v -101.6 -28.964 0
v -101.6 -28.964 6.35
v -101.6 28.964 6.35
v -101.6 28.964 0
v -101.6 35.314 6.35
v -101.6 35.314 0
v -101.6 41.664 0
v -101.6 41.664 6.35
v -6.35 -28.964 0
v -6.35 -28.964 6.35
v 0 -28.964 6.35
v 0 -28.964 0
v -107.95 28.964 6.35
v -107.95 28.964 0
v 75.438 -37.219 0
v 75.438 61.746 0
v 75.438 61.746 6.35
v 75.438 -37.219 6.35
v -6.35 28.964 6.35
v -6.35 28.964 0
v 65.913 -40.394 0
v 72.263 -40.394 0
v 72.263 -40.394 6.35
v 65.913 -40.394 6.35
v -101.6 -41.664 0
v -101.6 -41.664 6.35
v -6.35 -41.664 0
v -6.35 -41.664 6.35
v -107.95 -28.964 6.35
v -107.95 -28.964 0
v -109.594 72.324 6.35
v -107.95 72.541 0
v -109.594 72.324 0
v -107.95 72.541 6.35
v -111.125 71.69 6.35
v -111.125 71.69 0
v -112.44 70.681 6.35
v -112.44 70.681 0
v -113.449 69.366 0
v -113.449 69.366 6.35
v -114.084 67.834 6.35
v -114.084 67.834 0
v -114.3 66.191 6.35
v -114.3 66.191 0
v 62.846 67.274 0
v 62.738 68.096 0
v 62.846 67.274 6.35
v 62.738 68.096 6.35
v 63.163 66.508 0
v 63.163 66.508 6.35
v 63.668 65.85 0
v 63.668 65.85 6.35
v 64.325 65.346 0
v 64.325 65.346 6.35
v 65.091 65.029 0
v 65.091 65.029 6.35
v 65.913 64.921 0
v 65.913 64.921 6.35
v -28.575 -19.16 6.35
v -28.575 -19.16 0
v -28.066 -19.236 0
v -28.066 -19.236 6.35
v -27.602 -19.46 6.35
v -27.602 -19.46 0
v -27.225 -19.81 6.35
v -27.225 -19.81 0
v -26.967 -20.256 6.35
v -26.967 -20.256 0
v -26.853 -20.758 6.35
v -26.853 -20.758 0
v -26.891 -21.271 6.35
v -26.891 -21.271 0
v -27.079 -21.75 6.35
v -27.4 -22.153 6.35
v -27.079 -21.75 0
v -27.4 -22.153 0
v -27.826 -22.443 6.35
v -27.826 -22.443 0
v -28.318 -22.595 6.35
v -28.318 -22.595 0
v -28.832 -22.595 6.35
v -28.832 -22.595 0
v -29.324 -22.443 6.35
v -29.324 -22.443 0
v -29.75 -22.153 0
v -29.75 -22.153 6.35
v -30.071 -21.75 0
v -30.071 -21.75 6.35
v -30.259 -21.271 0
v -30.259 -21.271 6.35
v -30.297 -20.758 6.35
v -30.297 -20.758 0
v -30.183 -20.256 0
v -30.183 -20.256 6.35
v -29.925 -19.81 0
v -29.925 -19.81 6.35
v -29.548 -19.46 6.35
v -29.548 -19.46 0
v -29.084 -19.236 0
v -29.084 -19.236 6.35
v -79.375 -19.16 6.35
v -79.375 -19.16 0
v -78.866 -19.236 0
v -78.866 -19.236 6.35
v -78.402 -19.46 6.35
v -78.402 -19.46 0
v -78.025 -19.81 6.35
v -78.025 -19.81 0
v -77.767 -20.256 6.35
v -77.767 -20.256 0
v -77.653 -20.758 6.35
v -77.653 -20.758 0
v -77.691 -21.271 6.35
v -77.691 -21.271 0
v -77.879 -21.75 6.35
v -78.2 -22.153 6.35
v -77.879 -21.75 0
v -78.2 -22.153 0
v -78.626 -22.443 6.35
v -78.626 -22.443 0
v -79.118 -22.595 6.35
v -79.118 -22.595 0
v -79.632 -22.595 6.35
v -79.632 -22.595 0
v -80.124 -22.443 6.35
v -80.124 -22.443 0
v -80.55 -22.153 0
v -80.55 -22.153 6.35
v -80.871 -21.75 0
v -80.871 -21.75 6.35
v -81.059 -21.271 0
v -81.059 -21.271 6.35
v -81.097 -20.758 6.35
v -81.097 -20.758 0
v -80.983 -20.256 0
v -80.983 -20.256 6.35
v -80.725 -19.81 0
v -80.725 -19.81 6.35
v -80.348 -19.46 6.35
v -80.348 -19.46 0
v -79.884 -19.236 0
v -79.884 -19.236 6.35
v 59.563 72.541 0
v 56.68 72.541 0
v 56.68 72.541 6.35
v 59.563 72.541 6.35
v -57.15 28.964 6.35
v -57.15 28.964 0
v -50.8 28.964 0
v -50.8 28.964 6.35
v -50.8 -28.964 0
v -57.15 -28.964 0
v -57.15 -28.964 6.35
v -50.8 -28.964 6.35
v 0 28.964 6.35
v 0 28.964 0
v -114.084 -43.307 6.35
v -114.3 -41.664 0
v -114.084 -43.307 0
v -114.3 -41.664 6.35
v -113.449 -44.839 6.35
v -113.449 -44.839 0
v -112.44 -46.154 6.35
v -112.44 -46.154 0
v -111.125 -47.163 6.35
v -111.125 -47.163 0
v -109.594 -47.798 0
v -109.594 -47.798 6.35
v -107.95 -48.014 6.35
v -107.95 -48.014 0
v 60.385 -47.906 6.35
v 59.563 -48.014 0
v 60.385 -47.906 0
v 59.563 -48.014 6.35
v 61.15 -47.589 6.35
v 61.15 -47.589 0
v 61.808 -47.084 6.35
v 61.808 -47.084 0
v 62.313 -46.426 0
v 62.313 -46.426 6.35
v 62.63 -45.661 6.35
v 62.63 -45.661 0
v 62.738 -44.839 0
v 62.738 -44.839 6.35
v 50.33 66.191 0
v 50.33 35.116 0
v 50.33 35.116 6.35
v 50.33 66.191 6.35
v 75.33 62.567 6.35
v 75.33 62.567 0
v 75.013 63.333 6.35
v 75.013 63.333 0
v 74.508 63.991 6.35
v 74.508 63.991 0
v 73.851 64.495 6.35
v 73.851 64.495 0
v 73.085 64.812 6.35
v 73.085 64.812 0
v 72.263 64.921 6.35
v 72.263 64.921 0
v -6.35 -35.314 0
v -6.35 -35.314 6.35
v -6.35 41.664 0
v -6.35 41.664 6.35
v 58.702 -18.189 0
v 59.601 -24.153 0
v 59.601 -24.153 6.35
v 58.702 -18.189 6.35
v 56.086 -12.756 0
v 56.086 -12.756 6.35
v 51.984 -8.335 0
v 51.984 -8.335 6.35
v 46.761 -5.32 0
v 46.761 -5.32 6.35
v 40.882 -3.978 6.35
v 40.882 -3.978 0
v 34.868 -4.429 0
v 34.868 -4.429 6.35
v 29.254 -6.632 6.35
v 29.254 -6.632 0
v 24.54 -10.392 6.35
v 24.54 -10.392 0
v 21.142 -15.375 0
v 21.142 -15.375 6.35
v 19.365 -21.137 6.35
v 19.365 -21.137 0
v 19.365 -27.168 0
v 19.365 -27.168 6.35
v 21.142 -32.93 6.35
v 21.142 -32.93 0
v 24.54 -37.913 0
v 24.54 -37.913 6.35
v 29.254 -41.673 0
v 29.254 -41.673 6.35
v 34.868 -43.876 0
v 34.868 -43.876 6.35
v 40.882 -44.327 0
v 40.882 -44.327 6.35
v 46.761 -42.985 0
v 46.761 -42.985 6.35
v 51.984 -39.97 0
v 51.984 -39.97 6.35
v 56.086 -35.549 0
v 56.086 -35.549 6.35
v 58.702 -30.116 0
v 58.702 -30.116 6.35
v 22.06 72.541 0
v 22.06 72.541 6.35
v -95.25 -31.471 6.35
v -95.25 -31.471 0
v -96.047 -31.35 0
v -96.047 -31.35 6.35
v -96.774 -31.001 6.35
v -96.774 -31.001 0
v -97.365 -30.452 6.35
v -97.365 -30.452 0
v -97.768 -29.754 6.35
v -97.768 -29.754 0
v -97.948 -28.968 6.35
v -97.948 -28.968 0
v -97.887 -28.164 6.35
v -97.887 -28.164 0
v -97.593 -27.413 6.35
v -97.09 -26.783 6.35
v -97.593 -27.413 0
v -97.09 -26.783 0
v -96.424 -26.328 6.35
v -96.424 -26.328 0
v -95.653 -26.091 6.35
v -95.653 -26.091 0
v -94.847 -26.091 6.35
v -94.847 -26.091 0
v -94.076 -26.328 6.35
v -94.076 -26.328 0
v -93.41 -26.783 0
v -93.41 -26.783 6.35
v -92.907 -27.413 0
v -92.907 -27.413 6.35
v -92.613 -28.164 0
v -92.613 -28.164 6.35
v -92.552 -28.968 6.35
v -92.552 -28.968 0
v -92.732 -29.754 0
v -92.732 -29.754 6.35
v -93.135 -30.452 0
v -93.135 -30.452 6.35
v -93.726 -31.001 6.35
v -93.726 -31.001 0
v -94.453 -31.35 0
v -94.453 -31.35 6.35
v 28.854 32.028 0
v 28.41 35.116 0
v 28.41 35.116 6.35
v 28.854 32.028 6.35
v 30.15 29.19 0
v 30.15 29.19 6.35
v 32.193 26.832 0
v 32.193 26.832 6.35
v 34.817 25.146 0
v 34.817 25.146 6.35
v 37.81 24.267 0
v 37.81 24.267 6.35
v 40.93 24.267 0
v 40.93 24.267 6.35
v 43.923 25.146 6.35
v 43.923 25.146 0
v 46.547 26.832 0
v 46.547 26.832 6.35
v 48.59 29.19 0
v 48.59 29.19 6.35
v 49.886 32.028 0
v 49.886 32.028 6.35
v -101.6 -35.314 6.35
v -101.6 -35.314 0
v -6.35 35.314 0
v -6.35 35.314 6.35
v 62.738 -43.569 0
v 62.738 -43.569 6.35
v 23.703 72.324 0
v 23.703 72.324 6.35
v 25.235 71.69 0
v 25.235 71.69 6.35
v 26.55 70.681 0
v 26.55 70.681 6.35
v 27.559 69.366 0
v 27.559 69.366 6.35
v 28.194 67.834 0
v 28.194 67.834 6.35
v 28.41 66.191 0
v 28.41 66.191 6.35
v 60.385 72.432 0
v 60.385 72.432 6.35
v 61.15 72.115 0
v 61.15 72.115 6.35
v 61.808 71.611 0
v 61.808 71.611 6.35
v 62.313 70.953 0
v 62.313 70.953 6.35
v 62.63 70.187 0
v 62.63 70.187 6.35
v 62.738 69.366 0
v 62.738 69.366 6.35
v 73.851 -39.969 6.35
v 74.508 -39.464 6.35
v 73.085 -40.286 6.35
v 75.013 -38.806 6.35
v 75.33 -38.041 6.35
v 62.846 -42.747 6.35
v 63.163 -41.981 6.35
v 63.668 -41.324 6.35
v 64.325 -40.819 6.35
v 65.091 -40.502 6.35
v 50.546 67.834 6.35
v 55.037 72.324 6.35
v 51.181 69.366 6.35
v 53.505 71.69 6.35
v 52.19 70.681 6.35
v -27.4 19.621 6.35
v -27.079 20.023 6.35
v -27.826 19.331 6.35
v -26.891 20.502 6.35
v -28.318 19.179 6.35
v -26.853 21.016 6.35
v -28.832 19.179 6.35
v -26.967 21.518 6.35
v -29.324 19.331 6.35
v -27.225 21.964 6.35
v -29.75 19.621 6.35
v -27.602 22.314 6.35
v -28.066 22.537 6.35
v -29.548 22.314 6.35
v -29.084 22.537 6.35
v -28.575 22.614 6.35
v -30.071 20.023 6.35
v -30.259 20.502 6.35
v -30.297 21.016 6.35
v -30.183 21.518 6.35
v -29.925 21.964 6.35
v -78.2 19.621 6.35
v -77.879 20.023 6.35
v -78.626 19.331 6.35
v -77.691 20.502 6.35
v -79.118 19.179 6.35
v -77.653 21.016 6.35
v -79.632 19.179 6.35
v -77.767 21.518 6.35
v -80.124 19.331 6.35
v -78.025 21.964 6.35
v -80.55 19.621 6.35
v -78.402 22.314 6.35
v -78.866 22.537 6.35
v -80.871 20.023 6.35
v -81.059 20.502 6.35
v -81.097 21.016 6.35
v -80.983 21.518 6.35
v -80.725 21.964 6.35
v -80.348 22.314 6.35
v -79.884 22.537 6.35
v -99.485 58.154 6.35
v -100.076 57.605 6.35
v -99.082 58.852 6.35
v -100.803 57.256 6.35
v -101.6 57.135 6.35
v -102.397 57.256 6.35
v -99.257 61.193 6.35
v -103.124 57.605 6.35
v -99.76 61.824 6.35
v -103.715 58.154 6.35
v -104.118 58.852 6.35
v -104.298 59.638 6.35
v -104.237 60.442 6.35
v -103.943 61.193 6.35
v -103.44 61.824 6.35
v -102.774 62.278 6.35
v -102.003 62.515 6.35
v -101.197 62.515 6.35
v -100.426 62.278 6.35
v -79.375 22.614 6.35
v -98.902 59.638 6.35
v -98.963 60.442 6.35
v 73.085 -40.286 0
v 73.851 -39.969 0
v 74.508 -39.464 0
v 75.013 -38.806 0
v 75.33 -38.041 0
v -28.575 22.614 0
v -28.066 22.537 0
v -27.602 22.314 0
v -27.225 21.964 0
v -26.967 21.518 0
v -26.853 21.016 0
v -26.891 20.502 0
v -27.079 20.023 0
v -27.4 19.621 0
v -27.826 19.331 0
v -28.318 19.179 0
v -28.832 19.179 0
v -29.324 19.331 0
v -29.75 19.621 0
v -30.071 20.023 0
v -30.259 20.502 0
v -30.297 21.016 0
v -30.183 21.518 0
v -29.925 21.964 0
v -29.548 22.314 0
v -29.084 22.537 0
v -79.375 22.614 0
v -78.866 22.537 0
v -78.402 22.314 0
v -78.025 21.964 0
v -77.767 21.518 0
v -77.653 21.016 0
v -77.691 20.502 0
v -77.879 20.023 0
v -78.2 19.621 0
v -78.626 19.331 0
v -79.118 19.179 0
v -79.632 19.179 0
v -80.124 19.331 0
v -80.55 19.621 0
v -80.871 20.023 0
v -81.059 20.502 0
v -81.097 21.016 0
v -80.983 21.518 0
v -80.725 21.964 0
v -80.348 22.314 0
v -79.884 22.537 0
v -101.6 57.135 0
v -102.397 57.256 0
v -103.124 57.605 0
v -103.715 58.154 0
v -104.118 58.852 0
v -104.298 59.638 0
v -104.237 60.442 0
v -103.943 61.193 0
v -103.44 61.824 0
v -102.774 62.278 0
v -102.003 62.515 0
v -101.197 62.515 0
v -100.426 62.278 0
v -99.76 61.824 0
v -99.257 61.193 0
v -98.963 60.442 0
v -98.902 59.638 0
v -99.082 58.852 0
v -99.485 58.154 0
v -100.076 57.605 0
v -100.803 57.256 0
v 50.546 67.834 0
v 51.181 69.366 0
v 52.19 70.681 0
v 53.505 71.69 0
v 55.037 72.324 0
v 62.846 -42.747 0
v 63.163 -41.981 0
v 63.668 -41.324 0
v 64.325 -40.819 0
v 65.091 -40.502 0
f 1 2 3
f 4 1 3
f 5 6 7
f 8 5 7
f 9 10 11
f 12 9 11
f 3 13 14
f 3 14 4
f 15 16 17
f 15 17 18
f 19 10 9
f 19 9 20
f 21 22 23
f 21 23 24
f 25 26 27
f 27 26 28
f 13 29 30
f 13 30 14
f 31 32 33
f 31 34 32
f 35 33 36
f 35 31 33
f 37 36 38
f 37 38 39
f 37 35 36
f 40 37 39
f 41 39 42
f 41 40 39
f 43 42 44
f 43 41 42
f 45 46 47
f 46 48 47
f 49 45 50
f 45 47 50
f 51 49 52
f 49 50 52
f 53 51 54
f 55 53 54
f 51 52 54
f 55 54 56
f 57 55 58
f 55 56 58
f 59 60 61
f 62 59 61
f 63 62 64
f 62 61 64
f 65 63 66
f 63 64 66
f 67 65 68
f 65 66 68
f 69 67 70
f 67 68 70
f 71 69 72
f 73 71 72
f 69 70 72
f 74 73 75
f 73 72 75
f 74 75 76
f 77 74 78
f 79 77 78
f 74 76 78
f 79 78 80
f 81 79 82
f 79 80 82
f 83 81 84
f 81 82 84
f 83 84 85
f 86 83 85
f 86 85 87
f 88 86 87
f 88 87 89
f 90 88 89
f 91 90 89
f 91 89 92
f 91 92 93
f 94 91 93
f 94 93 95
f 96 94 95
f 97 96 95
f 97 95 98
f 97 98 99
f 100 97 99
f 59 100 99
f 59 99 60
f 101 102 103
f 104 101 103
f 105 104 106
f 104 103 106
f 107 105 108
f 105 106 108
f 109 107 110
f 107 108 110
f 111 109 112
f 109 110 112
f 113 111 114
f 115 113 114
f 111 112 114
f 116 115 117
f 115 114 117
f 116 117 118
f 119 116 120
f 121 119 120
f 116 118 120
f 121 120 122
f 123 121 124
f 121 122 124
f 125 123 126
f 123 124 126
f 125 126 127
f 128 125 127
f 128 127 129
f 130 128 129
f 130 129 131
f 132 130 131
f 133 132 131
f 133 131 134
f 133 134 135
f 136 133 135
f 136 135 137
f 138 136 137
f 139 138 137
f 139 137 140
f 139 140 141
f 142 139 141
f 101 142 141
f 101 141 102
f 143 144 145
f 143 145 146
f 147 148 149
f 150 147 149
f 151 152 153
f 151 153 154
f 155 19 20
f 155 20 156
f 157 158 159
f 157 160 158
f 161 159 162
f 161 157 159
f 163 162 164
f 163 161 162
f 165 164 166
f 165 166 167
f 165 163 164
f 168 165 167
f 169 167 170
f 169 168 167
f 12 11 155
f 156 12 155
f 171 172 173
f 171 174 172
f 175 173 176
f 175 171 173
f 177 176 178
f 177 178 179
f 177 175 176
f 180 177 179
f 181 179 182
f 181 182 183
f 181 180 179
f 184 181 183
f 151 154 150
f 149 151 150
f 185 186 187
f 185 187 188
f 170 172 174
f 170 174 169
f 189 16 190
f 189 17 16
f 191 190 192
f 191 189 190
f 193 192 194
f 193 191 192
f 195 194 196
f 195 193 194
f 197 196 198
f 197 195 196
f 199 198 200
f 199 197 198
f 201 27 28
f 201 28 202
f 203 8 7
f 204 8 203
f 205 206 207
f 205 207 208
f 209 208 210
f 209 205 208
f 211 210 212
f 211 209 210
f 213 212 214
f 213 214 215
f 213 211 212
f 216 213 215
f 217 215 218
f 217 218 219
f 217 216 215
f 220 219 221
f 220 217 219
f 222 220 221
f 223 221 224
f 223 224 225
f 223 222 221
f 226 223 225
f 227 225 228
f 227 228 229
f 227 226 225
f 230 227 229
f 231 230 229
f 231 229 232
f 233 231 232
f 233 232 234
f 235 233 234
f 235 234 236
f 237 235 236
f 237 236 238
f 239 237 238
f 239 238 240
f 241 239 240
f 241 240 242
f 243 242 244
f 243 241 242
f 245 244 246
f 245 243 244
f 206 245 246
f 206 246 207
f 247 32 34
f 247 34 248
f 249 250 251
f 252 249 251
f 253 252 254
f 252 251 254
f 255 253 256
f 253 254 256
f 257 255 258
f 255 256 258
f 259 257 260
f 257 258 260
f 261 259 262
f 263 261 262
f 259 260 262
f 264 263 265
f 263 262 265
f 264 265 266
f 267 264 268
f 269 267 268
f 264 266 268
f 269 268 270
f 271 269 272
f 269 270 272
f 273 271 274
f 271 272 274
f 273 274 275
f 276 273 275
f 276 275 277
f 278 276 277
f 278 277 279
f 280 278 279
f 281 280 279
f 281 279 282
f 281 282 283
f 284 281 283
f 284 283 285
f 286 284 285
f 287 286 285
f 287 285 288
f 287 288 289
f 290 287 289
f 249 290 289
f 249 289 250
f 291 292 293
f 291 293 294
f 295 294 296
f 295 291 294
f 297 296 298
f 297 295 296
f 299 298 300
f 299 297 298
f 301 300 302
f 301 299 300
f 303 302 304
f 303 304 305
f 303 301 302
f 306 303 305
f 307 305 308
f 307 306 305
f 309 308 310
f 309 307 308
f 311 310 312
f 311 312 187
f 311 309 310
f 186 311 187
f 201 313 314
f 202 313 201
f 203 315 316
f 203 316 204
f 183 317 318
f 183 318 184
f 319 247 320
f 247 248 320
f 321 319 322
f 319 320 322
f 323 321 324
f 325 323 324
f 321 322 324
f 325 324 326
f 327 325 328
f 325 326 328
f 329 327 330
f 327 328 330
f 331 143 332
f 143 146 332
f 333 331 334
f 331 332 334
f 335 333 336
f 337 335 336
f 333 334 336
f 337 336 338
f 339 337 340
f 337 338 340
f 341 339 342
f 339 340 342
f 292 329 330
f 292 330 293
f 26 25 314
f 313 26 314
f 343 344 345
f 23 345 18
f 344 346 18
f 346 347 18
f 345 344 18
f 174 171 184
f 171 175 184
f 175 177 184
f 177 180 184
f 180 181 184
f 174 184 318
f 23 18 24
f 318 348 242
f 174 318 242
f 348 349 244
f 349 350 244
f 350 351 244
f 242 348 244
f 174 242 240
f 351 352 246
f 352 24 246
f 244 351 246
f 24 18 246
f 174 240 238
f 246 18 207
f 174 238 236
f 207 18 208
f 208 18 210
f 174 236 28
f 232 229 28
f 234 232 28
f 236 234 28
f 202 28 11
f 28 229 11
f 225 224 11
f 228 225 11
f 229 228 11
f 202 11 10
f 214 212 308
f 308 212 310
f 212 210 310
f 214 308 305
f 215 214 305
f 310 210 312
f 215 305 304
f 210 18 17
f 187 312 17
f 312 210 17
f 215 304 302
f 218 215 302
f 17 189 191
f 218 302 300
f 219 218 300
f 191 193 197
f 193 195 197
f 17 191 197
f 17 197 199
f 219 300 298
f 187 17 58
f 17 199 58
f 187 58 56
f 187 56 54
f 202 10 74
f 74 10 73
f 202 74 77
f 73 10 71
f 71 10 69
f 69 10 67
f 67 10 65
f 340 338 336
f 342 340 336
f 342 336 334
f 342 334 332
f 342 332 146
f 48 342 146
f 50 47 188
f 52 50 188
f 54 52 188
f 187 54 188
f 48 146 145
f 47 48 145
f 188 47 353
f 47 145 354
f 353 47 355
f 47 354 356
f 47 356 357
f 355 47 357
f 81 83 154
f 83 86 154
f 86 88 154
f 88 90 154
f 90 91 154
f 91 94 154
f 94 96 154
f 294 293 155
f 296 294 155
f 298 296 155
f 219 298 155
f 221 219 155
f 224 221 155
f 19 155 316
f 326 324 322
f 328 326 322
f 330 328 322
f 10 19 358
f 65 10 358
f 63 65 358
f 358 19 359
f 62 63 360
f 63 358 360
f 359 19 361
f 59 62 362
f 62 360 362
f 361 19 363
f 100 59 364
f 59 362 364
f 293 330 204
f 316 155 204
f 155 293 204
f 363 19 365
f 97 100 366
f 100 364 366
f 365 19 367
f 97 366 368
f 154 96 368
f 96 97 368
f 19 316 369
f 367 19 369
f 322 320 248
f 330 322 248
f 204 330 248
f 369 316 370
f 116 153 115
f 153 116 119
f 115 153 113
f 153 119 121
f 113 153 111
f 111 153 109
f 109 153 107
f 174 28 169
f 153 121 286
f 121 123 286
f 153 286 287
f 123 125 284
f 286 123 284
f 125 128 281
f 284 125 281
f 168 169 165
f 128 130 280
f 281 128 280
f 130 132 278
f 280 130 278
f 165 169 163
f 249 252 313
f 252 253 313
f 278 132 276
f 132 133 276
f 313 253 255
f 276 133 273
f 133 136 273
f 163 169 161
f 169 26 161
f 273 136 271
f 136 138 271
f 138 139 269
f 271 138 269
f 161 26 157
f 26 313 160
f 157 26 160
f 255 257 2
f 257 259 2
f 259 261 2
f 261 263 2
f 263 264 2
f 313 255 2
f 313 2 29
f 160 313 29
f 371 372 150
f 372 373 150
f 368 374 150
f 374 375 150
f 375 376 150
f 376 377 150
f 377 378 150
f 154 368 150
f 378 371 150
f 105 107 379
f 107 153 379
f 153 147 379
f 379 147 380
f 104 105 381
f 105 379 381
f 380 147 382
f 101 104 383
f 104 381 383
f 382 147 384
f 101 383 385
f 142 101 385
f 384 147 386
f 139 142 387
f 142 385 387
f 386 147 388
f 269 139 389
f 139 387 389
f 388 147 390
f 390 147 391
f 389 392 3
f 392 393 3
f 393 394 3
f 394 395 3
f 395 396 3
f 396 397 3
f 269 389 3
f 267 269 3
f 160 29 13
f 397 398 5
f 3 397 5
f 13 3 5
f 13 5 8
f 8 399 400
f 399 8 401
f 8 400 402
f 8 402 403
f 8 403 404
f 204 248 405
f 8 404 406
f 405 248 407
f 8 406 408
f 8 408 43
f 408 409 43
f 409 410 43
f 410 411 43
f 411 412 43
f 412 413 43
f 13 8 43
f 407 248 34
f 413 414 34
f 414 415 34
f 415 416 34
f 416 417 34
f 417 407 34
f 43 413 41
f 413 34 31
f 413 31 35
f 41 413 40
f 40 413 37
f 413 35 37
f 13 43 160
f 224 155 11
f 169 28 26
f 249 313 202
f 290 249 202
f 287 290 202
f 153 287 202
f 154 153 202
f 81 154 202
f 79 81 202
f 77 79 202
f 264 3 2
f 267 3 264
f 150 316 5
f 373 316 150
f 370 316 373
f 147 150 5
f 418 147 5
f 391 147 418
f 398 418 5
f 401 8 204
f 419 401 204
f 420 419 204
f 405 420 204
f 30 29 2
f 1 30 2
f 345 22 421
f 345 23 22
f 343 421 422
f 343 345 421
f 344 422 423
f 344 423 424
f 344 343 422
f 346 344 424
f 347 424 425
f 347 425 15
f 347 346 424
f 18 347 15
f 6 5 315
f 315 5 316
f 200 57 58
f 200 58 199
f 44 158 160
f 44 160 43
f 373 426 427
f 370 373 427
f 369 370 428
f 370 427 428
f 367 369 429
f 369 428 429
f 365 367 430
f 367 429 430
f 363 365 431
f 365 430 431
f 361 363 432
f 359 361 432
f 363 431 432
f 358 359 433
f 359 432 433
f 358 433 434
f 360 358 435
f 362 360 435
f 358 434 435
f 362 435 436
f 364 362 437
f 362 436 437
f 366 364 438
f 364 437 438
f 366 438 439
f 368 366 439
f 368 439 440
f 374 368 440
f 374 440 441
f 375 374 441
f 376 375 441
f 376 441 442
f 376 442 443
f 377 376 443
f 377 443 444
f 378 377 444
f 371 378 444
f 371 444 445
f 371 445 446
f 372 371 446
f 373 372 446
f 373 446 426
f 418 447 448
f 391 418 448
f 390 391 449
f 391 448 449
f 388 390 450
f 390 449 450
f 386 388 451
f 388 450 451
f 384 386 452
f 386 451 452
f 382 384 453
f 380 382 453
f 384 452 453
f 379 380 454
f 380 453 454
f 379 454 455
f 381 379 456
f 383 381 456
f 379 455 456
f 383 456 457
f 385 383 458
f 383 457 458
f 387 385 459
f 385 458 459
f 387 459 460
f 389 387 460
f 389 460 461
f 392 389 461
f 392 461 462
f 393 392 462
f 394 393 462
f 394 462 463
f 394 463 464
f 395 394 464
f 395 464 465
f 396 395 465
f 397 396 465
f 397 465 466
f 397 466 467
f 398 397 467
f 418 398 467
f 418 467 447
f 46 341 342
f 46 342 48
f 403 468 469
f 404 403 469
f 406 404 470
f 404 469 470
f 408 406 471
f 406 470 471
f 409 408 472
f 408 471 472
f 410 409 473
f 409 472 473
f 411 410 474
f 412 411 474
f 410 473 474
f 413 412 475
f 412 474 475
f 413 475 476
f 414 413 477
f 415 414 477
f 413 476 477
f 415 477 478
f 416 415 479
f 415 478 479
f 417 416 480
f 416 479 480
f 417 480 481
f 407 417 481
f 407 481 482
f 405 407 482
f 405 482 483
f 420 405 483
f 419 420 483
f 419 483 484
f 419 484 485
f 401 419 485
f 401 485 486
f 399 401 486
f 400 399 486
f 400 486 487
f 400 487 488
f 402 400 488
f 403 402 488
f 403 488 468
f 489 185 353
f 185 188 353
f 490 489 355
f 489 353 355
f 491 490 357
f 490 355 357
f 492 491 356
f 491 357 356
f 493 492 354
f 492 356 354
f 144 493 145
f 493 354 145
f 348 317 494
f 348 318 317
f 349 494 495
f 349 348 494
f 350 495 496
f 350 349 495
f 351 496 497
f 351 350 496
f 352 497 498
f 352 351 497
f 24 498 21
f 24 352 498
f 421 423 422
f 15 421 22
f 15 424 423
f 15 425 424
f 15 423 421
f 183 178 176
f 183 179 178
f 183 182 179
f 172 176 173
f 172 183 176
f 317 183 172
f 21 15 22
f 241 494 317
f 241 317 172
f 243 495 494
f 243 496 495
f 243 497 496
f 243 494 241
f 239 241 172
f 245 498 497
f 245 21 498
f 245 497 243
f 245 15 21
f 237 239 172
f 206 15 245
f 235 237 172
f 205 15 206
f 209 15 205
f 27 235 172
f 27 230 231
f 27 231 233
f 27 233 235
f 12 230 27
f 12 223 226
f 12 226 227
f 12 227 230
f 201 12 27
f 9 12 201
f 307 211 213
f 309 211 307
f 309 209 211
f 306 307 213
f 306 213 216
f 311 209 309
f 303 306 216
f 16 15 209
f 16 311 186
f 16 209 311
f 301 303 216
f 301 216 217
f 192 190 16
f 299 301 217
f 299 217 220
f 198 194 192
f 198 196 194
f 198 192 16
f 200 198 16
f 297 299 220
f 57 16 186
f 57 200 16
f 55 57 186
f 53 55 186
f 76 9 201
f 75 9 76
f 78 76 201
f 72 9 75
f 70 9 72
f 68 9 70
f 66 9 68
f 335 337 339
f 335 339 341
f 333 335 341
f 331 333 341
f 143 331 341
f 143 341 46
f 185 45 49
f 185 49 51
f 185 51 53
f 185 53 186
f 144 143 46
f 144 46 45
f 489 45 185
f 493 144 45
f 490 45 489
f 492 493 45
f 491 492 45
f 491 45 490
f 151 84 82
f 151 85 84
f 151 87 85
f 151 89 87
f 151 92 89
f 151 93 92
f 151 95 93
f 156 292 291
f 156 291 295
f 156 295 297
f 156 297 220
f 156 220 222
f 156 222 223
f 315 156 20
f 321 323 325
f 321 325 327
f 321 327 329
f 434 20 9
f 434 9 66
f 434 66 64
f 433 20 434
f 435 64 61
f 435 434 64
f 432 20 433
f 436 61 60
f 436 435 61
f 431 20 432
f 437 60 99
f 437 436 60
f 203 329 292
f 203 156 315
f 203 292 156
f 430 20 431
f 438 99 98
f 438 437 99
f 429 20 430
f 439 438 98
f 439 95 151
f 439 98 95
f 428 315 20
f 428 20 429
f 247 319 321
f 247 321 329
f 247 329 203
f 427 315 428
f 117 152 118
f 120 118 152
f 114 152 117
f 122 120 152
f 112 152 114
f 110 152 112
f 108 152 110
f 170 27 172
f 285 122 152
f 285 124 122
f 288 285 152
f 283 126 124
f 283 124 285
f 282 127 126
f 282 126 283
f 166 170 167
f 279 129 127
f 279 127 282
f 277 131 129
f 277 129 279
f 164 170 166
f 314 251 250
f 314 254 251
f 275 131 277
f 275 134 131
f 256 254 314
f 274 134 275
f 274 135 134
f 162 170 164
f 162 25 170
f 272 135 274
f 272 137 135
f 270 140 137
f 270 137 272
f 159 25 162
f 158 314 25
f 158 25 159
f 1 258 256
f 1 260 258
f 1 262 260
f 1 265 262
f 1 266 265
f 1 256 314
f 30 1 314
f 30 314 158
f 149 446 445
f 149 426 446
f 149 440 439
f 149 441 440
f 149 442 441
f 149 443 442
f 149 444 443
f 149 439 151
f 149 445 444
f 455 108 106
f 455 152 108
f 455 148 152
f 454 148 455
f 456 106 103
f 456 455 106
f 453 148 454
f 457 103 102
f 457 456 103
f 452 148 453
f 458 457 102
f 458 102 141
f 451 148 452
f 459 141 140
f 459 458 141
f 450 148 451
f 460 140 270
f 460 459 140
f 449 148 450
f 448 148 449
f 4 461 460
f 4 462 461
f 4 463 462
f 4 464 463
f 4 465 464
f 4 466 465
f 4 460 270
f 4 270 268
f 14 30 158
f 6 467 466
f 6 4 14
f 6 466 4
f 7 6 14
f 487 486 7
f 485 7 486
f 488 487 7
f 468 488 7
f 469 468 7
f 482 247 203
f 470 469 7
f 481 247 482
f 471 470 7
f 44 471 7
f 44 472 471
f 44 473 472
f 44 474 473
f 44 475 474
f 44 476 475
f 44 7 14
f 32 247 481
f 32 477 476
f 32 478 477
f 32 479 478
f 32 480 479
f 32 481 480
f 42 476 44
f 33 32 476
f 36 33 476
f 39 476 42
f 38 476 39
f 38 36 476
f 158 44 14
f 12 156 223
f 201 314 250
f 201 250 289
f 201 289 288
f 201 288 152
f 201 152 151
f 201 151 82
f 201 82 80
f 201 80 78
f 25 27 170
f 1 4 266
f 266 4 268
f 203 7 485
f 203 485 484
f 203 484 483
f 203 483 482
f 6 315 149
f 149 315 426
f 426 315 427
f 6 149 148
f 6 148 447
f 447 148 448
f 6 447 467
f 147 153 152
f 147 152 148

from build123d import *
from OCP.BRepFilletAPI import BRepFilletAPI_MakeFillet

# Parameters (mm, degrees)
SKETCH1_R                   = 20.2311
BOSS_EXTRUDE1_DEPTH         = 6.35
FILLET1_R1                  = 6.35
FILLET1_R2                  = 3.175
TAP_DRILL_FOR_8_32_TAP3_D   = 3.4544
TAP_DRILL_FOR_1_4_28_TAP1_D = 5.4102
SKETCH13_W                  = 95.25
SKETCH13_H                  = 6.35
SKETCH13_W_2                = 6.35
SKETCH13_H_2                = 57.927875
CUT_EXTRUDE1_DEPTH          = 136.524699219


with BuildPart() as part:
    # Sketch1 → Boss-Extrude1 (new body)
    with BuildSketch(Plane.XY):
        with BuildLine():
            Line((-114.3, 72.540551407), (28.4099, 72.540551407))
            Line((28.4099, 72.540551407), (28.4099, 35.1155))
            ThreePointArc((28.4099, 35.1155), (39.37, 24.1554), (50.3301, 35.1155))
            Line((50.3301, 35.1155), (50.3301, 72.540551407))
            Line((50.3301, 72.540551407), (62.738, 72.540551407))
            Line((62.738, 72.540551407), (62.738, 64.920551407))
            Line((62.738, 64.920551407), (75.438, 64.920551407))
            Line((75.438, 64.920551407), (75.438, -40.3939375))
            Line((75.438, -40.3939375), (62.738, -40.3939375))
            Line((62.738, -40.3939375), (62.738, -48.0139375))
            Line((62.738, -48.0139375), (-114.3, -48.0139375))
            Line((-114.3, -48.0139375), (-114.3, 72.540551407))
        make_face()
        with Locations((39.37, -24.152515463)):
            Circle(SKETCH1_R, mode=Mode.SUBTRACT)
    extrude(amount=BOSS_EXTRUDE1_DEPTH)

    # Fillet1: one fillet with a radius per group of edges: ONE call of the kernel's fillet builder (fillet() takes one radius for all edges)
    fillet1_edges_1 = [part.edges().sort_by_distance(p)[0] for p in [
        (50.3301, 72.540551407, 3.175),
        (28.4099, 72.540551407, 3.175),
        (-114.3, 72.540551407, 3.175),
        (-114.3, -48.0139375, 3.175),
    ]]
    fillet1_edges_2 = [part.edges().sort_by_distance(p)[0] for p in [
        (62.738, 64.920551407, 3.175),
        (75.438, 64.920551407, 3.175),
        (62.738, 72.540551407, 3.175),
        (62.738, -48.0139375, 3.175),
        (62.738, -40.3939375, 3.175),
        (75.438, -40.3939375, 3.175),
    ]]
    fillet1 = BRepFilletAPI_MakeFillet(part.part.solid().wrapped)
    for e in fillet1_edges_1:
        fillet1.Add(FILLET1_R1, e.wrapped)
    for e in fillet1_edges_2:
        fillet1.Add(FILLET1_R2, e.wrapped)
    add(Compound.cast(fillet1.Shape()), mode=Mode.REPLACE)

    # Tap Drill for #8-32 Tap3 (through all)
    with Locations(Plane(origin=(-189.82086846, 75.287041891, 6.35), x_dir=(0, -1, 0), z_dir=(0, 0, 1))):
        with Locations((54.400304391, 110.44586846), (96.173779391, 110.44586846), (96.173779391, 161.24586846), (54.400304391, 161.24586846)):
            Hole(TAP_DRILL_FOR_8_32_TAP3_D / 2)

    # Tap Drill for 1/4-28 Tap1 (through all)
    with Locations(Plane(origin=(-189.82086846, 75.287041891, 6.35), x_dir=(0, 1, 0), z_dir=(0, 0, 1))):
        with Locations((-15.446490484, -88.22086846), (-104.052541891, -94.57086846)):
            Hole(TAP_DRILL_FOR_1_4_28_TAP1_D / 2)

    # Sketch13 → Cut-Extrude1 (cut, through all)
    with BuildSketch(Plane.XY.offset(6.35)):
        with Locations((-53.975, -38.4889375)):
            Rectangle(SKETCH13_W, SKETCH13_H)
        with Locations((-53.975, 0)):
            Rectangle(SKETCH13_W_2, SKETCH13_H_2)
        with Locations((-3.175, 0)):
            Rectangle(SKETCH13_W_2, SKETCH13_H_2)
        with Locations((-53.975, 38.4889375)):
            Rectangle(SKETCH13_W, SKETCH13_H)
        with Locations((-104.775, 0)):
            Rectangle(SKETCH13_W_2, SKETCH13_H_2)
    extrude(amount=-CUT_EXTRUDE1_DEPTH, mode=Mode.SUBTRACT)


solid = part.part
